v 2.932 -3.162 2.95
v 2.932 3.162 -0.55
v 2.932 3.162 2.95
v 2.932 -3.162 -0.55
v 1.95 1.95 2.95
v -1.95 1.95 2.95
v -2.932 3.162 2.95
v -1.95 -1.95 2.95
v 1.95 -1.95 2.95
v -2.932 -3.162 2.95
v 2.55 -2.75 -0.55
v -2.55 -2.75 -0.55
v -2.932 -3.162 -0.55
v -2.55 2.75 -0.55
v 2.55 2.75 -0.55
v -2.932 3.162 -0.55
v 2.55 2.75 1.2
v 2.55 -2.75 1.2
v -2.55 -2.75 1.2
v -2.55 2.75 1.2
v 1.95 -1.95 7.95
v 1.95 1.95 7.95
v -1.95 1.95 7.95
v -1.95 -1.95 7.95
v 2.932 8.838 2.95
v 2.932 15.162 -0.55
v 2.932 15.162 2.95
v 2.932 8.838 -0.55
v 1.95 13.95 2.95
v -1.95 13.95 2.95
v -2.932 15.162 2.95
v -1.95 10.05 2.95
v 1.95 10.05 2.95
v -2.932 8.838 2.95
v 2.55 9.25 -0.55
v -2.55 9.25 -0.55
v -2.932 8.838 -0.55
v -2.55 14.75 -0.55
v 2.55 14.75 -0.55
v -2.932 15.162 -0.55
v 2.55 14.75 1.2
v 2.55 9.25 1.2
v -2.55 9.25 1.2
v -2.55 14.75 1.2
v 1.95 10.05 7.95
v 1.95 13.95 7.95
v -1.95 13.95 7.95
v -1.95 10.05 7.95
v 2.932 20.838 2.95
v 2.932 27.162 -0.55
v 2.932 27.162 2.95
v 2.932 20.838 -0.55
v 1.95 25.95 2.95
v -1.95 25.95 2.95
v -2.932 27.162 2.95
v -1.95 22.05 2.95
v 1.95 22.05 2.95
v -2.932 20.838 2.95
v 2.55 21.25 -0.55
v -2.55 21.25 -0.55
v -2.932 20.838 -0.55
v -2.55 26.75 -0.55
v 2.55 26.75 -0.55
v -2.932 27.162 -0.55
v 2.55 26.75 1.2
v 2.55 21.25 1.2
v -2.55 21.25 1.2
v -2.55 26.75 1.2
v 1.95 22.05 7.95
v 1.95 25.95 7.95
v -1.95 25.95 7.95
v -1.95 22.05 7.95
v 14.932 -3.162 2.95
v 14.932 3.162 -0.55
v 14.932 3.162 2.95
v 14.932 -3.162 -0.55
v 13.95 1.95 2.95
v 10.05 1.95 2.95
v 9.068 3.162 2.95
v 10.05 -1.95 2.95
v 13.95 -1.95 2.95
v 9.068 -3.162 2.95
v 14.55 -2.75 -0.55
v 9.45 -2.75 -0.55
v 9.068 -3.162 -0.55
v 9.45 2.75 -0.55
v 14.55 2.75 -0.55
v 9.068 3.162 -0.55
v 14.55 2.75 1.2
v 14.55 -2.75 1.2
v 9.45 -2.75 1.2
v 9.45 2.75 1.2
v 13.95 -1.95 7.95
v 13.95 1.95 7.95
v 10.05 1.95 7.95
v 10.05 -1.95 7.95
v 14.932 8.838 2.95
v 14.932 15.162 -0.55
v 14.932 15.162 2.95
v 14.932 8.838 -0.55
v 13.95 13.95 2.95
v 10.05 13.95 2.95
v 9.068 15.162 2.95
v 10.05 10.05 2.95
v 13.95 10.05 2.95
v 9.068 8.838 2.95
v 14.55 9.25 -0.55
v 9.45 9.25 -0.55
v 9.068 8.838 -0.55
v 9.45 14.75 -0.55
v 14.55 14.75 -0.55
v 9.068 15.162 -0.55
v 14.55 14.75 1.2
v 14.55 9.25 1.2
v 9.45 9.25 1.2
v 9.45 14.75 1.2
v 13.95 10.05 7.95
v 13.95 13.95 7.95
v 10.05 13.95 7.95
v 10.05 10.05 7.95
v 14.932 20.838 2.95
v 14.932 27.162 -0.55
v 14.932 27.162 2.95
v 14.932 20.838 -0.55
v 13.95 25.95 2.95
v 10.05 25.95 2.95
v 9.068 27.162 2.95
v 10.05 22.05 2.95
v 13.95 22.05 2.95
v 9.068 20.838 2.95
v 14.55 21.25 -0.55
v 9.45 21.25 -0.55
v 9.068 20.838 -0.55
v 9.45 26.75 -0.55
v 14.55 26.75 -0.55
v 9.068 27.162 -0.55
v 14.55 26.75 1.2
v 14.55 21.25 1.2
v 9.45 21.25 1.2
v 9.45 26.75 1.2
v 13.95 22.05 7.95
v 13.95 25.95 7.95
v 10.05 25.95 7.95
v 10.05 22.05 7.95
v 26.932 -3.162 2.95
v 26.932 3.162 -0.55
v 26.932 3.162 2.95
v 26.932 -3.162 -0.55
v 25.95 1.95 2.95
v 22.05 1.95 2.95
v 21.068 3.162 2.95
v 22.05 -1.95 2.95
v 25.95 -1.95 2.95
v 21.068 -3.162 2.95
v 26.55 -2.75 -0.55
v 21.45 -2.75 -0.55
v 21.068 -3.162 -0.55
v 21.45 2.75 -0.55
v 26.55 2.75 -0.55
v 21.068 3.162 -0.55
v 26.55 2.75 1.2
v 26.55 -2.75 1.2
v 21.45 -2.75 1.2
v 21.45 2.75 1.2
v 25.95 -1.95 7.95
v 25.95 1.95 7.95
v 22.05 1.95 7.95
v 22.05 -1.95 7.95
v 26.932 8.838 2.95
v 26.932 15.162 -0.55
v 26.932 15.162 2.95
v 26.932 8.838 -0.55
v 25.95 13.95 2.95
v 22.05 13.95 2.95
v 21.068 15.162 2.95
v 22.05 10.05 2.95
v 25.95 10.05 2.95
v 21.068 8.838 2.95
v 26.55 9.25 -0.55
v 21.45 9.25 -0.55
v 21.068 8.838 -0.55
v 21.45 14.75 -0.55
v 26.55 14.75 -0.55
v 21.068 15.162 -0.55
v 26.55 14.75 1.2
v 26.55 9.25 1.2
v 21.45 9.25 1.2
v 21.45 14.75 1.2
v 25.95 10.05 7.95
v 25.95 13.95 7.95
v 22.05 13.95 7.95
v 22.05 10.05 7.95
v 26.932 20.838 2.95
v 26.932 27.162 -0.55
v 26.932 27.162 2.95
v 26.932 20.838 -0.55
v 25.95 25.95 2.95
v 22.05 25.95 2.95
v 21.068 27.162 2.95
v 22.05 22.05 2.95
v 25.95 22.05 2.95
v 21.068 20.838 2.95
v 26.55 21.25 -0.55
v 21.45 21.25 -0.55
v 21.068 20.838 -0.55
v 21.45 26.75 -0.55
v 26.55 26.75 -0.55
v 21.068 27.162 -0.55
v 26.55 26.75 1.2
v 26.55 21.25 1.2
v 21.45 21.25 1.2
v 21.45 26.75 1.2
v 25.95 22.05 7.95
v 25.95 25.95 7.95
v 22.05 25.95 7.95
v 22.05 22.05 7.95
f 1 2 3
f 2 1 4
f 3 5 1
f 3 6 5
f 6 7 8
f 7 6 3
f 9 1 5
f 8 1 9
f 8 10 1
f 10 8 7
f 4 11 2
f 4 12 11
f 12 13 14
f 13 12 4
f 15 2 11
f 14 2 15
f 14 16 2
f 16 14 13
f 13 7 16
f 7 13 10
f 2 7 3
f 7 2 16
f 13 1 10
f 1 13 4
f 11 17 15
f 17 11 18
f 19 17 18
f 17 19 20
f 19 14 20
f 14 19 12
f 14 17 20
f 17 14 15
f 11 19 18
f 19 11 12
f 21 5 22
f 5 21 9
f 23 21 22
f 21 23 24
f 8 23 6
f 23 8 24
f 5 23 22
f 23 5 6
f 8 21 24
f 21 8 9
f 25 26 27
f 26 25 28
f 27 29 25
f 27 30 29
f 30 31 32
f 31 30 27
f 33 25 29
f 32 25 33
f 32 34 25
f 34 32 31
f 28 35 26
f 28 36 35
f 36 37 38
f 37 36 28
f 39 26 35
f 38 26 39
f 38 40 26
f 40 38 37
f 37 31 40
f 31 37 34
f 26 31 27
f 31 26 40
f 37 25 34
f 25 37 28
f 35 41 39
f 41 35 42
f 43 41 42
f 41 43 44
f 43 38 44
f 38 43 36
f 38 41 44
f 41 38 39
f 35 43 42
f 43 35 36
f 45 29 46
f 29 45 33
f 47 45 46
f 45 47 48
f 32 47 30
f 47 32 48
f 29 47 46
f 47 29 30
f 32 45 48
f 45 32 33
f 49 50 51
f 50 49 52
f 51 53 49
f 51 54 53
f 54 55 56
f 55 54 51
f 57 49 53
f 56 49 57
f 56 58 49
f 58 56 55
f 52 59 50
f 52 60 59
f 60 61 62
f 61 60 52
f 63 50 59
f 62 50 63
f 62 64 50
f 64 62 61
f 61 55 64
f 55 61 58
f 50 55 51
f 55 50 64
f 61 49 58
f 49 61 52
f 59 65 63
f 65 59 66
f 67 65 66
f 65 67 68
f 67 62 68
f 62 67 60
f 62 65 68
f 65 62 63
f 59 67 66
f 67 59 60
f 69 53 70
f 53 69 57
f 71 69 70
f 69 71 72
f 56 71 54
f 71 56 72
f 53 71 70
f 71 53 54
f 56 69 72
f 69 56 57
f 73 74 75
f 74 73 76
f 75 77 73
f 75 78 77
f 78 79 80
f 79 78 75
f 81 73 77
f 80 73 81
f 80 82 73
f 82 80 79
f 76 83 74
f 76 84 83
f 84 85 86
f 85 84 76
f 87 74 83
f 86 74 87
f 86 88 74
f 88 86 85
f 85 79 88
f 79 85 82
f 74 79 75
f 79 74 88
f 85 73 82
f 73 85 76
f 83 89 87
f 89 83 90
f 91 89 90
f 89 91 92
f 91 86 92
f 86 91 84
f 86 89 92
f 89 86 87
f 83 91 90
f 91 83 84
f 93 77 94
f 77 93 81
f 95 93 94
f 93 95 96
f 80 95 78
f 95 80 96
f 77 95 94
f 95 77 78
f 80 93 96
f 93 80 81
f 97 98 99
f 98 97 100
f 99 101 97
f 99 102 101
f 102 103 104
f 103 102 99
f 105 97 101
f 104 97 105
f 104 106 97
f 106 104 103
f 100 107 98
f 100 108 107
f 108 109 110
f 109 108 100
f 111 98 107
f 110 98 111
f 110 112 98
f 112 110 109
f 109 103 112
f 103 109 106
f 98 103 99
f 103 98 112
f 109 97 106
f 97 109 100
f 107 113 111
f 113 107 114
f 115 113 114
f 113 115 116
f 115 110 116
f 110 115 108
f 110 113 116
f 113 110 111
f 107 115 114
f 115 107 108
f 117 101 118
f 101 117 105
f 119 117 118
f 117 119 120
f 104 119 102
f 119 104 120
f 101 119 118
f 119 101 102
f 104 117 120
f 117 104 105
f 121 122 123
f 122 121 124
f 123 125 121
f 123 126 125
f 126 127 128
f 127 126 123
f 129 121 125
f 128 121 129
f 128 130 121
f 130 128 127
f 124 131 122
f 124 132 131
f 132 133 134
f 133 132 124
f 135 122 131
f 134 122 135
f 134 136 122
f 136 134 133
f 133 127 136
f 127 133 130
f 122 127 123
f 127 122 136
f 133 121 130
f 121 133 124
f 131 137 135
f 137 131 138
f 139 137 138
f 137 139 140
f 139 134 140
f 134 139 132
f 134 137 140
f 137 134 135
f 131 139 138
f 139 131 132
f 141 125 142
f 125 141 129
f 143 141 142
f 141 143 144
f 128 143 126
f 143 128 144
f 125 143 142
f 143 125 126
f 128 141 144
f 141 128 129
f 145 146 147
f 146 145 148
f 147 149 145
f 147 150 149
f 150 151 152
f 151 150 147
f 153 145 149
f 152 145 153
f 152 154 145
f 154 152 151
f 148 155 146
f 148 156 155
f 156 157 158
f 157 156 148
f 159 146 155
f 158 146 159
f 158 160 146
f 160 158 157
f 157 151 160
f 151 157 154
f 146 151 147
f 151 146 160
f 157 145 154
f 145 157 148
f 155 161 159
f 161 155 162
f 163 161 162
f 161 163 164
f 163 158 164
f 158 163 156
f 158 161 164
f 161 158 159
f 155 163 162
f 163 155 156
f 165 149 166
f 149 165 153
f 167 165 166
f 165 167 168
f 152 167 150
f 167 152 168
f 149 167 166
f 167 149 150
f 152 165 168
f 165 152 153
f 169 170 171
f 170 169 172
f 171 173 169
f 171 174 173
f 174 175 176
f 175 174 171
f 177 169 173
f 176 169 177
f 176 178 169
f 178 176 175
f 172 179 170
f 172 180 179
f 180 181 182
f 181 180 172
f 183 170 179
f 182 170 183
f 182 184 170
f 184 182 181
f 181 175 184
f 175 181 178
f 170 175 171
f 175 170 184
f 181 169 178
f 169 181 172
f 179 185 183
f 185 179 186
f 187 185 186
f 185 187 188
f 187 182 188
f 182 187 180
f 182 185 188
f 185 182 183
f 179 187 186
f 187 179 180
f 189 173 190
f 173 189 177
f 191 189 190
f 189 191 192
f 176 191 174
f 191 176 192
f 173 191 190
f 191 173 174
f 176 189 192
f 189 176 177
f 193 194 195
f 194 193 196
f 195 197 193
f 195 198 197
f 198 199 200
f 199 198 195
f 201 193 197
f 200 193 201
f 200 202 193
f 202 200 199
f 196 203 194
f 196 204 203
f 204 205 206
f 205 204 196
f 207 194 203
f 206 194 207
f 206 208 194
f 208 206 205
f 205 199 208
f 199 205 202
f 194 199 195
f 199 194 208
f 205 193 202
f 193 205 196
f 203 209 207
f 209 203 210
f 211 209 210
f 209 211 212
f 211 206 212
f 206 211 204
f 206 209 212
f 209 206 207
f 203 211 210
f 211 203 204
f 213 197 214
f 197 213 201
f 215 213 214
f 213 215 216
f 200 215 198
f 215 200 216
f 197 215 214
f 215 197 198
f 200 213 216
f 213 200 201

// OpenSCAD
LED_x = 5.1;
LED_y = 5.5;
LED_z = 1.8;


x_carre_jour = 3.9; // avant

d_pcb_panel = 7;

module lightGuide()
{
translate([0,0,1.2])
{
union()
{

difference()
{
    // Pourtour
    cube([LED_x*1.15, LED_y*1.15, d_pcb_panel/2.0], center=true);
    translate([0,0,-LED_z/2])
    cube([LED_x, LED_y, LED_z], center=true);
}

translate([0,0,d_pcb_panel/2])
cube([x_carre_jour, x_carre_jour, d_pcb_panel/2 + 3], center=true);

}

}
}

// Définir les dimensions de l'objet à quadriller
largeur_objet = 10;
hauteur_objet = 10;

// Définir les dimensions du quadrillage
nombre_de_colonnes = 3;
nombre_de_lignes = 3;
espacement_entre_objets = 2;

// Créer le quadrillage en dupliquant l'objet
for (i = [0 : nombre_de_colonnes - 1]) {
    for (j = [0 : nombre_de_lignes - 1]) {
        translate([i * (largeur_objet + espacement_entre_objets), j * (hauteur_objet + espacement_entre_objets), 0])
            lightGuide();
    }
}
